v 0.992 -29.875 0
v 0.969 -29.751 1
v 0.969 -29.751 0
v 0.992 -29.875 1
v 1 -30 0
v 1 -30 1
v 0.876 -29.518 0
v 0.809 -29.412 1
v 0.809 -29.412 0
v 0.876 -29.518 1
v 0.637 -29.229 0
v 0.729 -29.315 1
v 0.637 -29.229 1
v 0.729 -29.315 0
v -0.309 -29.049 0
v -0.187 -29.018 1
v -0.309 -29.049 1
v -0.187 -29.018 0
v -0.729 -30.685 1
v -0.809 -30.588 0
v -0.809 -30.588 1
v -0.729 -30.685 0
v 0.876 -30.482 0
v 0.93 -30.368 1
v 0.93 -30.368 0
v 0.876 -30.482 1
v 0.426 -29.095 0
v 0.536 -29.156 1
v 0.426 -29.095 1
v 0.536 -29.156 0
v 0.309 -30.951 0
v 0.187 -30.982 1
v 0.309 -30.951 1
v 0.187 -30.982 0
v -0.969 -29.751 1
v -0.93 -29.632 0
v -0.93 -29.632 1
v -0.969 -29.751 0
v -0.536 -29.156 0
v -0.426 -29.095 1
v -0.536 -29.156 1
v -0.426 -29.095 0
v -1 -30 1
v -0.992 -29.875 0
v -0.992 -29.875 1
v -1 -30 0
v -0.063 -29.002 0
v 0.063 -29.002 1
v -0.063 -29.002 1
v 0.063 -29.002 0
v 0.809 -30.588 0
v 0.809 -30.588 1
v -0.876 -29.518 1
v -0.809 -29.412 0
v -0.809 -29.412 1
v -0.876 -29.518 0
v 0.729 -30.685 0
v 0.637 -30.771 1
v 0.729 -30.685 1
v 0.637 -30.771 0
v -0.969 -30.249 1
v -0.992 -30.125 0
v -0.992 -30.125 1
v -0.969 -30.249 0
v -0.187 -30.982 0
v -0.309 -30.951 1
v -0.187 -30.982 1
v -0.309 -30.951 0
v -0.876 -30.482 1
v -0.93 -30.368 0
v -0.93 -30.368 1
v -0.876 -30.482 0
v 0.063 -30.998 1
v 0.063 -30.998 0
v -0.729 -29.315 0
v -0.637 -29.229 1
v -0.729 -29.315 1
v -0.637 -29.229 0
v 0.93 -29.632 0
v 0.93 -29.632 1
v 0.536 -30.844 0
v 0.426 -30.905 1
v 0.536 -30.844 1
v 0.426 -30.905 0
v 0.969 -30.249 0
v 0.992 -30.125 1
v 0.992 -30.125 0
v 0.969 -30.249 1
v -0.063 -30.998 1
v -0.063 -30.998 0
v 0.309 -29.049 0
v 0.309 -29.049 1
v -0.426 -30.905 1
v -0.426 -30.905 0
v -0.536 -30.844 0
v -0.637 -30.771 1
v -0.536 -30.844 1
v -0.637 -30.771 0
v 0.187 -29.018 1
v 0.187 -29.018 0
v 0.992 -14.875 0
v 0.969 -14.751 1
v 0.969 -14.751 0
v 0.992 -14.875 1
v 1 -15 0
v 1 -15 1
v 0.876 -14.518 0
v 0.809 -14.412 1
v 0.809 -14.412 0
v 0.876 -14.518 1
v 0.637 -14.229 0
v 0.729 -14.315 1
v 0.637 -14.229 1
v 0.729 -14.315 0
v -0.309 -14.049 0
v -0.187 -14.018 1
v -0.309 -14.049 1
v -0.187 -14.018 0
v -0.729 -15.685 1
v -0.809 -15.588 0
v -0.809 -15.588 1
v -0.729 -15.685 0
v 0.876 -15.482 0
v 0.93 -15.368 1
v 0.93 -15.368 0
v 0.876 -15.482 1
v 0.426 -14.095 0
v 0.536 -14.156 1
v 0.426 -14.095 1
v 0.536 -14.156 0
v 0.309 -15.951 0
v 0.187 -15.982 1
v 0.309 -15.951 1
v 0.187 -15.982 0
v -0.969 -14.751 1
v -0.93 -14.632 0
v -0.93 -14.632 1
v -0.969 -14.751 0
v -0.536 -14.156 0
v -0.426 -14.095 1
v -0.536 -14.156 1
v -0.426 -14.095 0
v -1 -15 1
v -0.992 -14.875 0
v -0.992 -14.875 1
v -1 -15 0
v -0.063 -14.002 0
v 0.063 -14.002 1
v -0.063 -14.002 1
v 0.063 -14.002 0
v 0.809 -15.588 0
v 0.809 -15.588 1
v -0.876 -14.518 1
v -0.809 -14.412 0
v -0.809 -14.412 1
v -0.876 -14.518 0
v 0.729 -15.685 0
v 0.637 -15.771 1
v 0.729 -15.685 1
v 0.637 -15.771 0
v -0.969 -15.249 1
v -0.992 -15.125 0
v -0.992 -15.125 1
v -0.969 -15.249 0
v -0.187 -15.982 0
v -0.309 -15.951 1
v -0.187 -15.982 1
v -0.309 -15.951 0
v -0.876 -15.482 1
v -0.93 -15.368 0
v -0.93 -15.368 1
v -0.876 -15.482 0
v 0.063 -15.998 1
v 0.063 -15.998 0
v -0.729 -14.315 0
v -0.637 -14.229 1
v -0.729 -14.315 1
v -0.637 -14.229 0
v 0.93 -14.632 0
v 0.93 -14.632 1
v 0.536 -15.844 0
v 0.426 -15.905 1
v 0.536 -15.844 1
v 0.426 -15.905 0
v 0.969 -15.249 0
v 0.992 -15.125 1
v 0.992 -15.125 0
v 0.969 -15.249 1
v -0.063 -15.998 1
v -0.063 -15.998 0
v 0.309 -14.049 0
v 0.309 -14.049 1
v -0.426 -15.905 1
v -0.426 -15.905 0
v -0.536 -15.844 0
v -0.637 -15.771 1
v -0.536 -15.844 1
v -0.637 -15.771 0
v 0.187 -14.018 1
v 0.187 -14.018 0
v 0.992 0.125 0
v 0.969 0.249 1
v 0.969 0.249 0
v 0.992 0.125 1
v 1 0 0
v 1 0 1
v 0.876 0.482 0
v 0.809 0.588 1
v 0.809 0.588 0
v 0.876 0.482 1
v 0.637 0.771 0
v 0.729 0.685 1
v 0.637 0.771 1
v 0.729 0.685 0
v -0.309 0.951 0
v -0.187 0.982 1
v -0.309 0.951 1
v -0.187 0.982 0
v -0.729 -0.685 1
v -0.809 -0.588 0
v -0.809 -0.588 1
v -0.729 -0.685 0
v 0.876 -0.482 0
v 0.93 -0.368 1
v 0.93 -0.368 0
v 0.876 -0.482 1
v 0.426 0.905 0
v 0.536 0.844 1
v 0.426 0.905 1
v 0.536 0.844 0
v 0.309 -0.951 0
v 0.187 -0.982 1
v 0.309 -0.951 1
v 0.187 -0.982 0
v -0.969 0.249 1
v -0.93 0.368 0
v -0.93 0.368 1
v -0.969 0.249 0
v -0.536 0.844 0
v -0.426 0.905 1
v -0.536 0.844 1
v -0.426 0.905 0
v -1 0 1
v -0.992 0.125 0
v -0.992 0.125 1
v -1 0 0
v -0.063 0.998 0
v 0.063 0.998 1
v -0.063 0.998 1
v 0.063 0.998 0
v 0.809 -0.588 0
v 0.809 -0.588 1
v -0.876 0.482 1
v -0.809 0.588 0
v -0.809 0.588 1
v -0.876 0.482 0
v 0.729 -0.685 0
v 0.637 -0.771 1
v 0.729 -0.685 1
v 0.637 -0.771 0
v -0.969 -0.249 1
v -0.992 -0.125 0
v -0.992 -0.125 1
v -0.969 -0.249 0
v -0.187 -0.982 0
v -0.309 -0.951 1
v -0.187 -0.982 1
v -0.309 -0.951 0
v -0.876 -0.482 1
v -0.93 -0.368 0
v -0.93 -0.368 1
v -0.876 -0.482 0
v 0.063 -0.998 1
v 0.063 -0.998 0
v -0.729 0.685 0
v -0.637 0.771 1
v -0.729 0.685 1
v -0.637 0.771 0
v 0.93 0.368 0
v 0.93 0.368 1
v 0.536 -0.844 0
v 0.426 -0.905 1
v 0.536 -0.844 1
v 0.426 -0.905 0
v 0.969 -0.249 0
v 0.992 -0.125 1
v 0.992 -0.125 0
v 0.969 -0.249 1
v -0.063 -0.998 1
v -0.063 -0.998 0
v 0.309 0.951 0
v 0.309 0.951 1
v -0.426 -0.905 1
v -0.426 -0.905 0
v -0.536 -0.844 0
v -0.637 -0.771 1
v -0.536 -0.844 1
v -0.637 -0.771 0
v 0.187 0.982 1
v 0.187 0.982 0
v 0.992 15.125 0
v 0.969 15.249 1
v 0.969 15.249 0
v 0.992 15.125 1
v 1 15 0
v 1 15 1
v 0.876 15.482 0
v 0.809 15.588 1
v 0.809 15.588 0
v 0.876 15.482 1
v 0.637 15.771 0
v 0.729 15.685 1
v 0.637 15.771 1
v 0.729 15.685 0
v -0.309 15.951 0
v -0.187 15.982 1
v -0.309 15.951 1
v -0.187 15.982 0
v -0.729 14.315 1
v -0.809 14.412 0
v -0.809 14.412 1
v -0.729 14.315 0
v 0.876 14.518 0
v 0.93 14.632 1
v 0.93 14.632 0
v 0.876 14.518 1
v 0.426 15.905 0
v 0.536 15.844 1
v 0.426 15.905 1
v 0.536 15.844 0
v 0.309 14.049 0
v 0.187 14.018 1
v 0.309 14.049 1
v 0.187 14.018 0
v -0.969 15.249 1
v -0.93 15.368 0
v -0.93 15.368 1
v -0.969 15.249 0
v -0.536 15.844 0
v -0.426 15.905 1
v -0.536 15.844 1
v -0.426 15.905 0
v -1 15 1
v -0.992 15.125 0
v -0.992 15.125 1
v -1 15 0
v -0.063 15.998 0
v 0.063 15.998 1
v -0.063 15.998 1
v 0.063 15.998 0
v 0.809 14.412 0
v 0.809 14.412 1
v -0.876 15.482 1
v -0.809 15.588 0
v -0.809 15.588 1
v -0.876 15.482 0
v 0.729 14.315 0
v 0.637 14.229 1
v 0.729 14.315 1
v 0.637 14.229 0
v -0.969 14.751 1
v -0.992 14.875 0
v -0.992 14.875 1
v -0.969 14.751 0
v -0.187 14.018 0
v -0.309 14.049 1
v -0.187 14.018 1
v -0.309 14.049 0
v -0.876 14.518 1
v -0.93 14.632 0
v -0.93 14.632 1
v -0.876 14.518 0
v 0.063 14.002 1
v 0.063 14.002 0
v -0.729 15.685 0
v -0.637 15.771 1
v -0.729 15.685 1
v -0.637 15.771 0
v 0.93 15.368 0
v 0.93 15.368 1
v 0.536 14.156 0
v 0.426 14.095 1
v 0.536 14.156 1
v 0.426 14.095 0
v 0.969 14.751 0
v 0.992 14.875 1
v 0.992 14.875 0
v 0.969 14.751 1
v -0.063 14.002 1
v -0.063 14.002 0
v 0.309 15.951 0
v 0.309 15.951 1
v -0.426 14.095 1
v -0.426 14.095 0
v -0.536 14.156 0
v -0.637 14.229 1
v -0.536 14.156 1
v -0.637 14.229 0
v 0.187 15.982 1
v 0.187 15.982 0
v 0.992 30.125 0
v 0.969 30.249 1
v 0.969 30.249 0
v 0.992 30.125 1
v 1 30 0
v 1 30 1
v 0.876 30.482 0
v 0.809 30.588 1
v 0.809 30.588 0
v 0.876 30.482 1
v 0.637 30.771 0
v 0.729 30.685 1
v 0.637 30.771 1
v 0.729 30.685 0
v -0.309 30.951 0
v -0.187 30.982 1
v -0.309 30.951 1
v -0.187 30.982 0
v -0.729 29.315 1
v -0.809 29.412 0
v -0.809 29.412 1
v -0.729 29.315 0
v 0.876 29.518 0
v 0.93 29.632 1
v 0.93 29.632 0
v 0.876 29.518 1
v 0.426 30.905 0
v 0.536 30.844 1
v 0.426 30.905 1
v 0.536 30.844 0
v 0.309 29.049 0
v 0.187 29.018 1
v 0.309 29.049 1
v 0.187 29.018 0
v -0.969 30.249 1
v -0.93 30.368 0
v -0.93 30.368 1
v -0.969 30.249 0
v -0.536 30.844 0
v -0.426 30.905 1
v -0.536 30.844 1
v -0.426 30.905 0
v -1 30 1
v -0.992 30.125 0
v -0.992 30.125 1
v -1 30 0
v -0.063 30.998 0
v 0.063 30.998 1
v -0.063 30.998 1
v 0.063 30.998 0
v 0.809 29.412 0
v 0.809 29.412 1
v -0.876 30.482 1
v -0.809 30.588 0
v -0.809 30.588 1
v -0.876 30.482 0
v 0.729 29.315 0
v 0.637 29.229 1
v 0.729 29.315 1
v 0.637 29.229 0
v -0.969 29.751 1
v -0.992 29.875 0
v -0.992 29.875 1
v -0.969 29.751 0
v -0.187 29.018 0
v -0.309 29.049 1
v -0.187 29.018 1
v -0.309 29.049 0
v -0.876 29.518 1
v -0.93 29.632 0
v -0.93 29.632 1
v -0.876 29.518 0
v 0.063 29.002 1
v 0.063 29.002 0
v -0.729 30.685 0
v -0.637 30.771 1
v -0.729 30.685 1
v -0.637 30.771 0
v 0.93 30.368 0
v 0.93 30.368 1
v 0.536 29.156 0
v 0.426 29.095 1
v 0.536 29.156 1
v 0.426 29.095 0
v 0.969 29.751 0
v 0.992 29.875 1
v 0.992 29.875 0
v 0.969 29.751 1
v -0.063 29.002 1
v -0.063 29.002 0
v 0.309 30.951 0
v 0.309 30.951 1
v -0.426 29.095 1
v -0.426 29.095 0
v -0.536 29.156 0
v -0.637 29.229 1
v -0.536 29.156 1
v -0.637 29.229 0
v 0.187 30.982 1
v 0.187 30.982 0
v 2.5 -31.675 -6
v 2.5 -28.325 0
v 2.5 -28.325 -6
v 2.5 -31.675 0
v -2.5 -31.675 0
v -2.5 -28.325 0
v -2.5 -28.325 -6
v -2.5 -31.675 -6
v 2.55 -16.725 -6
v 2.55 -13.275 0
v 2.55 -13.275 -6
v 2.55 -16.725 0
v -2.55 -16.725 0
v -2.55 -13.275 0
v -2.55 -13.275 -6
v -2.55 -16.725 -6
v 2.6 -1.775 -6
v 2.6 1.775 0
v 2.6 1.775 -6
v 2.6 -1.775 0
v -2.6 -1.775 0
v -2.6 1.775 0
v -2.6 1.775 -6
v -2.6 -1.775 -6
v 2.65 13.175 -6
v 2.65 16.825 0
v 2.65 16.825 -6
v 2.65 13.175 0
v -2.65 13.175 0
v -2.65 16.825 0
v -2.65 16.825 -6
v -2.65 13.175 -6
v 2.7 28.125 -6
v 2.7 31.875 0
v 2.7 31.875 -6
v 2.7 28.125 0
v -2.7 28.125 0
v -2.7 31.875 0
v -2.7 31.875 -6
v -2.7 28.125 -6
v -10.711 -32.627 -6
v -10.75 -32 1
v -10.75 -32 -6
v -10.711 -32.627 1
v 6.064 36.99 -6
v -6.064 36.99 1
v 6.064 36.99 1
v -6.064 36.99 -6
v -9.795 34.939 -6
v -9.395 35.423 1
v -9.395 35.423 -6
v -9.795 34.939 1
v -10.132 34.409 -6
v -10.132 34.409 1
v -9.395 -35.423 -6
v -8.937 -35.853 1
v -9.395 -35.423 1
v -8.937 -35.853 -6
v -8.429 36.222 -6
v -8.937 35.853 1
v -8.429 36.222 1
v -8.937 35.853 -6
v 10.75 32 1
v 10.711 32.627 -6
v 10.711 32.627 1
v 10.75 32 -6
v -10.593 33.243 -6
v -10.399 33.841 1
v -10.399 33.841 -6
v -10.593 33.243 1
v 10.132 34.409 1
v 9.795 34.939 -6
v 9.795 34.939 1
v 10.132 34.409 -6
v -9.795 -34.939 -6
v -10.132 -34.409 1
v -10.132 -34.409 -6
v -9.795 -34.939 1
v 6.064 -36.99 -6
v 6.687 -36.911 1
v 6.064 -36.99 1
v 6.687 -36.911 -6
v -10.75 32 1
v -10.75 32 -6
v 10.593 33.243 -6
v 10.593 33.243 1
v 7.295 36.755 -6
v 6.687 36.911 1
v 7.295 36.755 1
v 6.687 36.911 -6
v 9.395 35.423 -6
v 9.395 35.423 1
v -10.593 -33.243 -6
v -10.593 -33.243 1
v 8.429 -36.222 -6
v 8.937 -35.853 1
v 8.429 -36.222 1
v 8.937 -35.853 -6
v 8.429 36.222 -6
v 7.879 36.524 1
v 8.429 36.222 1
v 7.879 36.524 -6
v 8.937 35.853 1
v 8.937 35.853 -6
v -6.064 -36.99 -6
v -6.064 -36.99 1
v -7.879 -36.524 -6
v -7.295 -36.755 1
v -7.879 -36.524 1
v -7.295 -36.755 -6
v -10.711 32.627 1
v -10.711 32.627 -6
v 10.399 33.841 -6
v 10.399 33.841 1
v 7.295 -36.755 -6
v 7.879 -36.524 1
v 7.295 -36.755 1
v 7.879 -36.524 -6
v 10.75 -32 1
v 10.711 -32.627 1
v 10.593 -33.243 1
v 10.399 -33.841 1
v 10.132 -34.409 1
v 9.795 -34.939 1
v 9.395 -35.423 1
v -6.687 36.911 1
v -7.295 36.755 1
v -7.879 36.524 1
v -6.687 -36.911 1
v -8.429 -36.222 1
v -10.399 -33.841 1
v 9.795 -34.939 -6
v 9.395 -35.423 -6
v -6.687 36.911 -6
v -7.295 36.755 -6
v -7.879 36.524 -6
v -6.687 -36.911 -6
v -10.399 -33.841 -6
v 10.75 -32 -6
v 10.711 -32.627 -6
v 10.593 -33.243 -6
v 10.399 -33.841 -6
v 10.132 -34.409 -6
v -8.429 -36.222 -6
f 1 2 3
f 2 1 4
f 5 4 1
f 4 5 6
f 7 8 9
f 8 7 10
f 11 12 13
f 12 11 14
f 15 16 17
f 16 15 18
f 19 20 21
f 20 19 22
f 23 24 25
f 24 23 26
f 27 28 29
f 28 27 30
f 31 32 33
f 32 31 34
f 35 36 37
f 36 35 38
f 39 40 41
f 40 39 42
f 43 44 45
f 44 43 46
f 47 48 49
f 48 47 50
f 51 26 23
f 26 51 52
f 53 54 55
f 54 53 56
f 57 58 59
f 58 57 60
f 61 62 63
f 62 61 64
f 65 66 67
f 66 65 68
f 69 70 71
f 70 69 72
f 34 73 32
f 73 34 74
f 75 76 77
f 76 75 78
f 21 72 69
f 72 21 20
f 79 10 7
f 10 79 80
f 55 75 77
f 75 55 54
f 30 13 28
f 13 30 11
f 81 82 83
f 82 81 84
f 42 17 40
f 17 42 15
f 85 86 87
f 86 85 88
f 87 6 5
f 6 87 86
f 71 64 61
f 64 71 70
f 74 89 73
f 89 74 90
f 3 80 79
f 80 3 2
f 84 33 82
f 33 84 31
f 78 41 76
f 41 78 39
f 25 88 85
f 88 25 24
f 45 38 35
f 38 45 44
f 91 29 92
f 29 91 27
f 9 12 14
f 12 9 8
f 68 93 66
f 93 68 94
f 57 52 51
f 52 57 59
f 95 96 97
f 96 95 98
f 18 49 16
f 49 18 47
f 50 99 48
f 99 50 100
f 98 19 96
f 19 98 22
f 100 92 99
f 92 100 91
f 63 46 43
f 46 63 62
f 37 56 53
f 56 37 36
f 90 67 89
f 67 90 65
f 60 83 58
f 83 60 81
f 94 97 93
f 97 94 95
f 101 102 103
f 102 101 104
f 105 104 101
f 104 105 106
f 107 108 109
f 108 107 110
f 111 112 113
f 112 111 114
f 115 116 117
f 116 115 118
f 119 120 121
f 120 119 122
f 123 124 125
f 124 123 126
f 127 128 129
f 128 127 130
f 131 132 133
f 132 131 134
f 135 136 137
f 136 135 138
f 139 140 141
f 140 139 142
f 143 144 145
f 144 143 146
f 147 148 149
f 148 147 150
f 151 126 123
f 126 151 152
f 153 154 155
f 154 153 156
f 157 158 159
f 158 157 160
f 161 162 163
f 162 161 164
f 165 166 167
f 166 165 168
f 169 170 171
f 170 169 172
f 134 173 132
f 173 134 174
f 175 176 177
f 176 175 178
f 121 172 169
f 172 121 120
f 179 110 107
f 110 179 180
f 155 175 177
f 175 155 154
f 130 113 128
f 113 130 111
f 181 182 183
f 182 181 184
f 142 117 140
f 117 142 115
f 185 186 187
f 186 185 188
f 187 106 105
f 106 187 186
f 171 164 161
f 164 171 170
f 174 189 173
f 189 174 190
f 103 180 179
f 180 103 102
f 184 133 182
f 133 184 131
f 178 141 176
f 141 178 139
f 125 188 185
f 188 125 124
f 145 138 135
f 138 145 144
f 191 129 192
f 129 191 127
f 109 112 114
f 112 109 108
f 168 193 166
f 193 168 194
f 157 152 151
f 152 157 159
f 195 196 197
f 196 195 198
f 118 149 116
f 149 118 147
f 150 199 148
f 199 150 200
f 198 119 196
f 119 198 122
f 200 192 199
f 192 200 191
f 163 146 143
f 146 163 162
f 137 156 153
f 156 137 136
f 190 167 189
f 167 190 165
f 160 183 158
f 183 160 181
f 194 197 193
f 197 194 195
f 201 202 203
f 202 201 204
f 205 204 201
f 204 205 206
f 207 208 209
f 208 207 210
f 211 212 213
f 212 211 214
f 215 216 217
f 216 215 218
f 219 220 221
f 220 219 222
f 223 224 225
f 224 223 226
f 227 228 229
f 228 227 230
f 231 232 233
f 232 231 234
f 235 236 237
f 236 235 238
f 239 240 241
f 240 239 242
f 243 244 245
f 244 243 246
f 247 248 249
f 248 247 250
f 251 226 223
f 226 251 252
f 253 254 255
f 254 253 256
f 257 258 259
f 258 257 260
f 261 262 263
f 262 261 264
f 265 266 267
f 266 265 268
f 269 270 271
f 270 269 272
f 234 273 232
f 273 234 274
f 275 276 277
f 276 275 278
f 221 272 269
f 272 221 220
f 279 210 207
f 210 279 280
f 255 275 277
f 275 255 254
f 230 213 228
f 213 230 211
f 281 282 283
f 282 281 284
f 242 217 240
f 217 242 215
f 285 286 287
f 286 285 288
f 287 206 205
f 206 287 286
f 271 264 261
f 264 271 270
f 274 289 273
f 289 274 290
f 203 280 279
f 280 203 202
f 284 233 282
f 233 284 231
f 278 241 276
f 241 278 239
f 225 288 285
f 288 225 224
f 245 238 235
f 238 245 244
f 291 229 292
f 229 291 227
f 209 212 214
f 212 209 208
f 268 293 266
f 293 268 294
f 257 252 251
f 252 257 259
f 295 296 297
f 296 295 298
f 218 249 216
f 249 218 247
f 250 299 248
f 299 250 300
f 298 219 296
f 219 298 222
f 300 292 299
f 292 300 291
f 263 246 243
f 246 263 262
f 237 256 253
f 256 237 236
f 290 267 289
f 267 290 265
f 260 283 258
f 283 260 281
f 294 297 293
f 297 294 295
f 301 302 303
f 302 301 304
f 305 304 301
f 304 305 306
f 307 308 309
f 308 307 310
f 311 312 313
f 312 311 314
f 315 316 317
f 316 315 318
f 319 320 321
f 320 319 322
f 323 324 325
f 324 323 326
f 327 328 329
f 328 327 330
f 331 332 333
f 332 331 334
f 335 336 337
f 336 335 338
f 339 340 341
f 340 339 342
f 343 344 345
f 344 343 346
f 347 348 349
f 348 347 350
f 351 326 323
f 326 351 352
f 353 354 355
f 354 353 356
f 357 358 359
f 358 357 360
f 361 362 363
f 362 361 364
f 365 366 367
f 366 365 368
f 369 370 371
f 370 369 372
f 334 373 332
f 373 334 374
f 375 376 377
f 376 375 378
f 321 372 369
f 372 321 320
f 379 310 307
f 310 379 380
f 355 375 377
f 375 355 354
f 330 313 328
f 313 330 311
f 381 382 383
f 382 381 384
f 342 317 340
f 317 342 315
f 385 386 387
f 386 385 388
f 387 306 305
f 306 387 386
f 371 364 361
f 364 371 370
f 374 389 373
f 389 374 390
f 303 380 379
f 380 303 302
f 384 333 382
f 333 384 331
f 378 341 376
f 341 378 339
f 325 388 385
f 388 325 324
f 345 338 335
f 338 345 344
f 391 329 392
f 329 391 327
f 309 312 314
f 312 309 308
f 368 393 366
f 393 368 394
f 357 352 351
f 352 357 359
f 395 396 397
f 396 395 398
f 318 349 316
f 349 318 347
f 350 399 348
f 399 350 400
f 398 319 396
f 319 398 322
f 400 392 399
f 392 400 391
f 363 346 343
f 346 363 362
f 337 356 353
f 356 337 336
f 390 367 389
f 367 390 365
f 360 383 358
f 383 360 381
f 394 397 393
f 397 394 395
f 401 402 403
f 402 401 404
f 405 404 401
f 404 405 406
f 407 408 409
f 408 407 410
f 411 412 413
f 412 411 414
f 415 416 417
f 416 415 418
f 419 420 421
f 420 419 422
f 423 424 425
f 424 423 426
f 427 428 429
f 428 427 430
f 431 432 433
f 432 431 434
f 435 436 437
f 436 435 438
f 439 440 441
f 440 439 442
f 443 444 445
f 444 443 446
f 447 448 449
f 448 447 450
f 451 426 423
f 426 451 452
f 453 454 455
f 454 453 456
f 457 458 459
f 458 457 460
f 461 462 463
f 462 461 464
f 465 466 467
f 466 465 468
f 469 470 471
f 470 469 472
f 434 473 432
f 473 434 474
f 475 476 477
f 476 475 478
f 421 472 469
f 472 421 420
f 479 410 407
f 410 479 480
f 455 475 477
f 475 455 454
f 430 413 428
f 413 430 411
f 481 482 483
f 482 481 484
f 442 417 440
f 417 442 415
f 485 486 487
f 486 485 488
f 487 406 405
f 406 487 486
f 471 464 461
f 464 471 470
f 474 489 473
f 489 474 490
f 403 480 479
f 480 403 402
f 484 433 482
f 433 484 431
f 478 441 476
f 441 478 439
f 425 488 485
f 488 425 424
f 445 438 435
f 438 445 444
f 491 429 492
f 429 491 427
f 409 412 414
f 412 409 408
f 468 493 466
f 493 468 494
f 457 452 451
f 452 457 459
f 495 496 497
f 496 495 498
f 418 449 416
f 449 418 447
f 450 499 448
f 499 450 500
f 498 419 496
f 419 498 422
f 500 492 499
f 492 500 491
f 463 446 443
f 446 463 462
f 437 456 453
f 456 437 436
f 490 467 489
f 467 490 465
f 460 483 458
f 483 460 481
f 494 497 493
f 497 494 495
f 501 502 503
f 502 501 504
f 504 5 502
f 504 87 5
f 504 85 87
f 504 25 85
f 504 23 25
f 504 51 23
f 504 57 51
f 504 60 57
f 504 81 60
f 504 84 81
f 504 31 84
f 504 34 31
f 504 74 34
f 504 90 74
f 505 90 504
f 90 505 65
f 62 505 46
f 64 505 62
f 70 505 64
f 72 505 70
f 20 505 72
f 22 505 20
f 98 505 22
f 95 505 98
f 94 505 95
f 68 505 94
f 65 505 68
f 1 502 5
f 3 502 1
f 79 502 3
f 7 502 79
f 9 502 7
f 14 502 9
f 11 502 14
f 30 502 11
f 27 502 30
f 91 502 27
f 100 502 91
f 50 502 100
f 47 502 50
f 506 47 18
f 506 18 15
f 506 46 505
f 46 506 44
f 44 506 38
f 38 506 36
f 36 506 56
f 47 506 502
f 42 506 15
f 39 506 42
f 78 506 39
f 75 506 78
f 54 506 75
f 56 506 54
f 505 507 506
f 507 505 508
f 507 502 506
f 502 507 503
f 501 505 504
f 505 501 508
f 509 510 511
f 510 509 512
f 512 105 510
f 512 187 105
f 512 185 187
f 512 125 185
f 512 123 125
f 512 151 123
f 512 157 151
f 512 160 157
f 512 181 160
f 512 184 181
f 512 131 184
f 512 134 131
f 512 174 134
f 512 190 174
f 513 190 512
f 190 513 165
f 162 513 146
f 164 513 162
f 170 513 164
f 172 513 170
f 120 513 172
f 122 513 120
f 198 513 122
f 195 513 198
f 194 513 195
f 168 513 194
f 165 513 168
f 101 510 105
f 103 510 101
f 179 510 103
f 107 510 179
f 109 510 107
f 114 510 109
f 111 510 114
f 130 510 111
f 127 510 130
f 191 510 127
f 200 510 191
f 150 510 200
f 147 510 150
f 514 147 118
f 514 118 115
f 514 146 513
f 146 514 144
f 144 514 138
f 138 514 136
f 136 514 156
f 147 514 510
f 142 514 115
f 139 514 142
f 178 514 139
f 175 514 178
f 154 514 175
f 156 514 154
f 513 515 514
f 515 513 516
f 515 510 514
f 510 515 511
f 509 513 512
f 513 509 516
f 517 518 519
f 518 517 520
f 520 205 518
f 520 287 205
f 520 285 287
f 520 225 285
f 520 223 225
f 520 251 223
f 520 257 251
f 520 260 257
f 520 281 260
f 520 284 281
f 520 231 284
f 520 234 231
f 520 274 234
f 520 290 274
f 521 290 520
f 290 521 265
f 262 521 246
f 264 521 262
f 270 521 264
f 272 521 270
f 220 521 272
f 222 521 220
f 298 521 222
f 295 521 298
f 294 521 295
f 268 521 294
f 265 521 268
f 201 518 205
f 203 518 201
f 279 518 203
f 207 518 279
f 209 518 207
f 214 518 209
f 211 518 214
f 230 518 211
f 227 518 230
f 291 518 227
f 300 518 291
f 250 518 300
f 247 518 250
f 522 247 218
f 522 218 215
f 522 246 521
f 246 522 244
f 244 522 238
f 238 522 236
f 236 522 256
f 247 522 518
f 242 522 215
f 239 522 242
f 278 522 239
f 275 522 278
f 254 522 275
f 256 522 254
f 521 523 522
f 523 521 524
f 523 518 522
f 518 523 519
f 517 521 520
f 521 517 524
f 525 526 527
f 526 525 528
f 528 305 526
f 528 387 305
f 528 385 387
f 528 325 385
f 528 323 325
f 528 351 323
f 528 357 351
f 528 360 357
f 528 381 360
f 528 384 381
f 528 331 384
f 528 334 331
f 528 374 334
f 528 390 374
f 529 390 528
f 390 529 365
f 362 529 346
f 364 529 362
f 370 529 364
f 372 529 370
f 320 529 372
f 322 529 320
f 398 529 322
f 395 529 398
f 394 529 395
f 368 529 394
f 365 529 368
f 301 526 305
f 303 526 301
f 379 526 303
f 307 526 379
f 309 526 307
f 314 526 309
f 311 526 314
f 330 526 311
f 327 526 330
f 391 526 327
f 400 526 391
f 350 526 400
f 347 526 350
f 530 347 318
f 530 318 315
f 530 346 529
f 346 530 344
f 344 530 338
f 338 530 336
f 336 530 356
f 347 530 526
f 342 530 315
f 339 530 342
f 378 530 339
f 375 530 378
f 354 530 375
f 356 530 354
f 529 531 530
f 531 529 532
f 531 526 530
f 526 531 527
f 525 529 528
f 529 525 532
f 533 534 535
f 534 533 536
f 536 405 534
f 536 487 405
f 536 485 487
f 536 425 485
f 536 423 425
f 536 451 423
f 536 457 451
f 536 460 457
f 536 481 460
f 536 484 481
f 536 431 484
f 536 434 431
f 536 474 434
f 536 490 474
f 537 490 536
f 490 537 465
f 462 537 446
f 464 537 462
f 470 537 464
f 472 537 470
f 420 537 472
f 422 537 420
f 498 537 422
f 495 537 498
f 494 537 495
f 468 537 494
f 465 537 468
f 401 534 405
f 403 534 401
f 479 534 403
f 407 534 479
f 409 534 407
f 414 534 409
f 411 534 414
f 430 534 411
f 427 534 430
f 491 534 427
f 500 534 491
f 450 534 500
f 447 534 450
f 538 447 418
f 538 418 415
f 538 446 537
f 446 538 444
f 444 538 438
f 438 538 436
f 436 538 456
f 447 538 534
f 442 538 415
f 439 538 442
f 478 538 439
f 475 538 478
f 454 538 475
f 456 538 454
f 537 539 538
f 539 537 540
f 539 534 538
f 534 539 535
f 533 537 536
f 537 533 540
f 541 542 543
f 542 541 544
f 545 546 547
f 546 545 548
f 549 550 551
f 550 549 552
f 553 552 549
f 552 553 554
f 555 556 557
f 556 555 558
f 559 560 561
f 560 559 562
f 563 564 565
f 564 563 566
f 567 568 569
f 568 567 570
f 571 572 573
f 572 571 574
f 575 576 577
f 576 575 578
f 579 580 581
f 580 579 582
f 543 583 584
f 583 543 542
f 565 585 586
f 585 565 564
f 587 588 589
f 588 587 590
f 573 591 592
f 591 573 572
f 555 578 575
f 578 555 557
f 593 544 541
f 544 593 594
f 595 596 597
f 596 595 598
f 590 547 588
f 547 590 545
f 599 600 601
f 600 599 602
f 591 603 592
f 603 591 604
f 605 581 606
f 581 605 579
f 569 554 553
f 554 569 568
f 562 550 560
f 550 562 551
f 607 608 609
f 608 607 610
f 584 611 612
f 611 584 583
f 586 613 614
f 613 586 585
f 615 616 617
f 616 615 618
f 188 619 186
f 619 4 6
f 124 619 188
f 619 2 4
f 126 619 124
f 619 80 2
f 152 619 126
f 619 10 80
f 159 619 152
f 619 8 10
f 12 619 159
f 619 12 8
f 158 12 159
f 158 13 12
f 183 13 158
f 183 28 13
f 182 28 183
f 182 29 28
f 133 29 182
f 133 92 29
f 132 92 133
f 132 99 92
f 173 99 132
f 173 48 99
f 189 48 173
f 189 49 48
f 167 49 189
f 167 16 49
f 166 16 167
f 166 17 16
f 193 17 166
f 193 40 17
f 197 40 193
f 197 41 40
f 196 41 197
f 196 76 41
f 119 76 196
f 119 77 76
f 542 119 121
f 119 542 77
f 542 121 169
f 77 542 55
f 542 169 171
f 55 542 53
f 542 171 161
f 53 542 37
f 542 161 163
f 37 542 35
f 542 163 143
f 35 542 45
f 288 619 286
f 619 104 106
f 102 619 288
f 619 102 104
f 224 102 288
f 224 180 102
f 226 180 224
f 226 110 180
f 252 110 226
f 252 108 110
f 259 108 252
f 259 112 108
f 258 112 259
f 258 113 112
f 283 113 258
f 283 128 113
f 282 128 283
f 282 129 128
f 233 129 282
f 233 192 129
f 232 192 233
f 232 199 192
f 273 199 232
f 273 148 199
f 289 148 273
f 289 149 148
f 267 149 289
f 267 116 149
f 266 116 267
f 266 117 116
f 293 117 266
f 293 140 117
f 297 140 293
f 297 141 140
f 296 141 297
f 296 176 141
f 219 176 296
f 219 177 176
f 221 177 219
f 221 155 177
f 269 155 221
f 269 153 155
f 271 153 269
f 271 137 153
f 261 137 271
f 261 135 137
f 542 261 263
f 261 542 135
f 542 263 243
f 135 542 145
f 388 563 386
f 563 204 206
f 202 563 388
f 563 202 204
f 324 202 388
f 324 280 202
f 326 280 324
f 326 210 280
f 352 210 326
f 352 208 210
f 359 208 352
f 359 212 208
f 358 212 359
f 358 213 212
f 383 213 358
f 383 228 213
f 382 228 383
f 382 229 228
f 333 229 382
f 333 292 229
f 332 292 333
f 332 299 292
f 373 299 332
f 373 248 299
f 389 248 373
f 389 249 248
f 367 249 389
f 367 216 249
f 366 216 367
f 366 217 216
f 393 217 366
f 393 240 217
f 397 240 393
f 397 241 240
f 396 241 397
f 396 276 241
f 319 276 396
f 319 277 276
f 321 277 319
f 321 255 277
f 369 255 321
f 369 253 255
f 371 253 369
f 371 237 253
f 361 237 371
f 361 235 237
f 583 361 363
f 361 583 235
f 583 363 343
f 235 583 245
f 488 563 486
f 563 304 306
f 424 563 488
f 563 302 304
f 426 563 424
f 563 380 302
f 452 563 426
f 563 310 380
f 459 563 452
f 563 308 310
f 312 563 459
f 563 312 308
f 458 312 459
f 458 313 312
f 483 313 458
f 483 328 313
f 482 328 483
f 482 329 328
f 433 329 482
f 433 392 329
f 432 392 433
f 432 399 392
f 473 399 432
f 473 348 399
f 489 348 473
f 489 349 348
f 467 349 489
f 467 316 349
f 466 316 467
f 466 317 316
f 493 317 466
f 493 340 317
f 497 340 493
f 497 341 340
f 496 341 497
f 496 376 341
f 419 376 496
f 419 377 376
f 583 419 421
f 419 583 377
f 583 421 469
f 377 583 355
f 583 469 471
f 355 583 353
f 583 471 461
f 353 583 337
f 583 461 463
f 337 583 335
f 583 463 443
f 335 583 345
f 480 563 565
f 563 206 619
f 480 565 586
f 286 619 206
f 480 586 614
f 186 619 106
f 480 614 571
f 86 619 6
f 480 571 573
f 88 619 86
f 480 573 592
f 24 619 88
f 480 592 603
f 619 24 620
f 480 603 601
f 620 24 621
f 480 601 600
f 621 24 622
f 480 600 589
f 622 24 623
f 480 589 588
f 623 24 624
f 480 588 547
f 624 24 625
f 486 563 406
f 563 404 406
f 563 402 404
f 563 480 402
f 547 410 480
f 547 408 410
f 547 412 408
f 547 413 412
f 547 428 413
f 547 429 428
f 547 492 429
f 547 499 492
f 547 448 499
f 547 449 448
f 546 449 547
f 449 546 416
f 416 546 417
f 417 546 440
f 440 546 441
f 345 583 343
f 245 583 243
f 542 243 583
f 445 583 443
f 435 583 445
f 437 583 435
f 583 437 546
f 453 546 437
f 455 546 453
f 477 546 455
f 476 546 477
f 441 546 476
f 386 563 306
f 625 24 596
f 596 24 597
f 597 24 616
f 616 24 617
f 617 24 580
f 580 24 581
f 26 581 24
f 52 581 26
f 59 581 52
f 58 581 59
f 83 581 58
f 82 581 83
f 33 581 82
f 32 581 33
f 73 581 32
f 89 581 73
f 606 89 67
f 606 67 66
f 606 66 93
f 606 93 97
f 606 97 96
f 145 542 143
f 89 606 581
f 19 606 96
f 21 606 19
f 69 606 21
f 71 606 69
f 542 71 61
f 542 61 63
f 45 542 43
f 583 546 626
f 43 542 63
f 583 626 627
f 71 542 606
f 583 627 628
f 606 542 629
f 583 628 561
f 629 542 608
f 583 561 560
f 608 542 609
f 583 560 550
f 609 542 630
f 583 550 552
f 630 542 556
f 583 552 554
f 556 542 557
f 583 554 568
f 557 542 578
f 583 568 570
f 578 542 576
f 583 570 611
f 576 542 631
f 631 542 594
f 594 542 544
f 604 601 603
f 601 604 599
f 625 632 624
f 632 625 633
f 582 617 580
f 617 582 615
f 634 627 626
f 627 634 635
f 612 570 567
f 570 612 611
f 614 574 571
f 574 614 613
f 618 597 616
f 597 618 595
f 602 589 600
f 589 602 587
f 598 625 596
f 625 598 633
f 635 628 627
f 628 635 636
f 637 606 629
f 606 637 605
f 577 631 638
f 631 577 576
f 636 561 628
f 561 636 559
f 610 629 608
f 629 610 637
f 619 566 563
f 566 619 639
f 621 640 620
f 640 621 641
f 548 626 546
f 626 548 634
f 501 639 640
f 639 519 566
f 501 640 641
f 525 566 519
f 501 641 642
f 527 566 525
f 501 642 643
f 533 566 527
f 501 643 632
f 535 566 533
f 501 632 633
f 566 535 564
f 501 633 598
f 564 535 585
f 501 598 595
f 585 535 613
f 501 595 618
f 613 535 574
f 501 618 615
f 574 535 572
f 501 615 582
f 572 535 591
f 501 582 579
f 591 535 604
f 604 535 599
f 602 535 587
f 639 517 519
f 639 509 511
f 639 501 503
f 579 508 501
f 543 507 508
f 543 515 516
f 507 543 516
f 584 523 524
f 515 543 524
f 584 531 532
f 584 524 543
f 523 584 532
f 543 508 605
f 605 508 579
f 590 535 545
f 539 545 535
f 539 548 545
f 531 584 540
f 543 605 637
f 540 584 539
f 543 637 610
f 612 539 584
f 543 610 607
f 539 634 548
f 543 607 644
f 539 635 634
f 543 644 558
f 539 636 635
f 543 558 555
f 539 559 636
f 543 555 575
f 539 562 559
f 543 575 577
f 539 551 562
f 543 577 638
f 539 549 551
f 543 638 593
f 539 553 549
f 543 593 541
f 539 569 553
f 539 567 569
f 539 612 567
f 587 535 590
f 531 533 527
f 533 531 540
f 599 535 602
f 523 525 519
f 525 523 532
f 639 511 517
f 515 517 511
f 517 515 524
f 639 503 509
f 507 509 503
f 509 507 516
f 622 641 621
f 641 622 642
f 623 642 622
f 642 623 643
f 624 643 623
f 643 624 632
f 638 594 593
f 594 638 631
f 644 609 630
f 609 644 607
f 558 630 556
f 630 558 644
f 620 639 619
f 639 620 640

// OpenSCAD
$fn = 50;


difference() {
	union() {
		*color(alpha = 1.0000000000, c = "gray") {
			translate(v = [0, 14, -6]) {
				linear_extrude(height = 5) {
					text(font = "Arial:style=Bold", halign = "center", size = 4.5000000000, text = "COMMENT description oobb_plate_shape_p_type_7_depth_0_0_-6_pos_1.5_width_5_height", valign = "center");
				}
			}
		}
		translate(v = [0, 0, -6]) {
			hull() {
				translate(v = [-5.7500000000, 32.0000000000, 0]) {
					cylinder(h = 7, r = 5);
				}
				translate(v = [5.7500000000, 32.0000000000, 0]) {
					cylinder(h = 7, r = 5);
				}
				translate(v = [-5.7500000000, -32.0000000000, 0]) {
					cylinder(h = 7, r = 5);
				}
				translate(v = [5.7500000000, -32.0000000000, 0]) {
					cylinder(h = 7, r = 5);
				}
			}
		}
		*color(alpha = 1.0000000000, c = "gray") {
			translate(v = [0, 21, 0]) {
				linear_extrude(height = 1) {
					text(font = "Arial:style=Bold", halign = "center", size = 4.5000000000, text = "COMMENT oobb_motor_tt_01_0_0", valign = "center");
				}
			}
		}
		*color(alpha = 1.0000000000, c = "gray") {
			translate(v = [0, 14, 0]) {
				linear_extrude(height = 1) {
					text(font = "Arial:style=Bold", halign = "center", size = 4.5000000000, text = " radius_extra : 0", valign = "center");
				}
			}
		}
		*color(alpha = 1.0000000000, c = "gray") {
			translate(v = [0, 36, 0]) {
				linear_extrude(height = 1) {
					text(font = "Arial:style=Bold", halign = "center", size = 4.5000000000, text = "COMMENT oobb_motor_tt_01_0.1_0.1", valign = "center");
				}
			}
		}
		*color(alpha = 1.0000000000, c = "gray") {
			translate(v = [0, 29, 0]) {
				linear_extrude(height = 1) {
					text(font = "Arial:style=Bold", halign = "center", size = 4.5000000000, text = " radius_extra : 0.1", valign = "center");
				}
			}
		}
		*color(alpha = 1.0000000000, c = "gray") {
			translate(v = [0, 51, 0]) {
				linear_extrude(height = 1) {
					text(font = "Arial:style=Bold", halign = "center", size = 4.5000000000, text = "COMMENT oobb_motor_tt_01_0.2_0.2", valign = "center");
				}
			}
		}
		*color(alpha = 1.0000000000, c = "gray") {
			translate(v = [0, 44, 0]) {
				linear_extrude(height = 1) {
					text(font = "Arial:style=Bold", halign = "center", size = 4.5000000000, text = " radius_extra : 0.2", valign = "center");
				}
			}
		}
		*color(alpha = 1.0000000000, c = "gray") {
			translate(v = [0, 66, 0]) {
				linear_extrude(height = 1) {
					text(font = "Arial:style=Bold", halign = "center", size = 4.5000000000, text = "COMMENT oobb_motor_tt_01_0.3_0.3", valign = "center");
				}
			}
		}
		*color(alpha = 1.0000000000, c = "gray") {
			translate(v = [0, 59, 0]) {
				linear_extrude(height = 1) {
					text(font = "Arial:style=Bold", halign = "center", size = 4.5000000000, text = " radius_extra : 0.3", valign = "center");
				}
			}
		}
		*color(alpha = 1.0000000000, c = "gray") {
			translate(v = [0, 81, 0]) {
				linear_extrude(height = 1) {
					text(font = "Arial:style=Bold", halign = "center", size = 4.5000000000, text = "COMMENT oobb_motor_tt_01_0.4_0.4", valign = "center");
				}
			}
		}
		*color(alpha = 1.0000000000, c = "gray") {
			translate(v = [0, 74, 0]) {
				linear_extrude(height = 1) {
					text(font = "Arial:style=Bold", halign = "center", size = 4.5000000000, text = " radius_extra : 0.4", valign = "center");
				}
			}
		}
	}
	union() {
		translate(v = [0, -30, 2]) {
			rotate(a = [0, 0, 0]) {
				difference() {
					union() {
						translate(v = [0, 0, -12.0000000000]) {
							cylinder(h = 12, r = 0.7500000000);
						}
						cylinder(h = 52.5000000000, r = 2.7500000000);
						translate(v = [0, 0, -12.0000000000]) {
							cylinder(h = 12, r = 1.0000000000);
						}
						translate(v = [-1.2500000000, -2.7500000000, -0.3000000000]) {
							cube(size = [2.5000000000, 5.5000000000, 0.3000000000]);
						}
						translate(v = [-1.2500000000, -1.2500000000, -0.6000000000]) {
							cube(size = [2.5000000000, 2.5000000000, 0.3000000000]);
						}
						translate(v = [0, 0, -12.0000000000]) {
							cylinder(h = 12, r = 0.7500000000);
						}
					}
					union();
				}
			}
		}
		translate(v = [0, -15, 2]) {
			rotate(a = [0, 0, 0]) {
				difference() {
					union() {
						translate(v = [0, 0, -12.0000000000]) {
							cylinder(h = 12, r = 0.7500000000);
						}
						cylinder(h = 52.5000000000, r = 2.7500000000);
						translate(v = [0, 0, -12.0000000000]) {
							cylinder(h = 12, r = 1.0000000000);
						}
						translate(v = [-1.2500000000, -2.7500000000, -0.3000000000]) {
							cube(size = [2.5000000000, 5.5000000000, 0.3000000000]);
						}
						translate(v = [-1.2500000000, -1.2500000000, -0.6000000000]) {
							cube(size = [2.5000000000, 2.5000000000, 0.3000000000]);
						}
						translate(v = [0, 0, -12.0000000000]) {
							cylinder(h = 12, r = 0.7500000000);
						}
					}
					union();
				}
			}
		}
		translate(v = [0, 0, 2]) {
			rotate(a = [0, 0, 0]) {
				difference() {
					union() {
						translate(v = [0, 0, -12.0000000000]) {
							cylinder(h = 12, r = 0.7500000000);
						}
						cylinder(h = 52.5000000000, r = 2.7500000000);
						translate(v = [0, 0, -12.0000000000]) {
							cylinder(h = 12, r = 1.0000000000);
						}
						translate(v = [-1.2500000000, -2.7500000000, -0.3000000000]) {
							cube(size = [2.5000000000, 5.5000000000, 0.3000000000]);
						}
						translate(v = [-1.2500000000, -1.2500000000, -0.6000000000]) {
							cube(size = [2.5000000000, 2.5000000000, 0.3000000000]);
						}
						translate(v = [0, 0, -12.0000000000]) {
							cylinder(h = 12, r = 0.7500000000);
						}
					}
					union();
				}
			}
		}
		translate(v = [0, 15, 2]) {
			rotate(a = [0, 0, 0]) {
				difference() {
					union() {
						translate(v = [0, 0, -12.0000000000]) {
							cylinder(h = 12, r = 0.7500000000);
						}
						cylinder(h = 52.5000000000, r = 2.7500000000);
						translate(v = [0, 0, -12.0000000000]) {
							cylinder(h = 12, r = 1.0000000000);
						}
						translate(v = [-1.2500000000, -2.7500000000, -0.3000000000]) {
							cube(size = [2.5000000000, 5.5000000000, 0.3000000000]);
						}
						translate(v = [-1.2500000000, -1.2500000000, -0.6000000000]) {
							cube(size = [2.5000000000, 2.5000000000, 0.3000000000]);
						}
						translate(v = [0, 0, -12.0000000000]) {
							cylinder(h = 12, r = 0.7500000000);
						}
					}
					union();
				}
			}
		}
		translate(v = [0, 30, 2]) {
			rotate(a = [0, 0, 0]) {
				difference() {
					union() {
						translate(v = [0, 0, -12.0000000000]) {
							cylinder(h = 12, r = 0.7500000000);
						}
						cylinder(h = 52.5000000000, r = 2.7500000000);
						translate(v = [0, 0, -12.0000000000]) {
							cylinder(h = 12, r = 1.0000000000);
						}
						translate(v = [-1.2500000000, -2.7500000000, -0.3000000000]) {
							cube(size = [2.5000000000, 5.5000000000, 0.3000000000]);
						}
						translate(v = [-1.2500000000, -1.2500000000, -0.6000000000]) {
							cube(size = [2.5000000000, 2.5000000000, 0.3000000000]);
						}
						translate(v = [0, 0, -12.0000000000]) {
							cylinder(h = 12, r = 0.7500000000);
						}
					}
					union();
				}
			}
		}
		*color(alpha = 1.0000000000, c = "gray") {
			translate(v = [0, 14, 0]) {
				linear_extrude(height = 1) {
					text(font = "Arial:style=Bold", halign = "center", size = 4.5000000000, text = "COMMENT description oobb_motor_tt_01_shape_n_type_50_depth_0_-30_0_pos_shaft_part_30_comment_shift_line_{}_extra_0_radius_extra", valign = "center");
				}
			}
		}
		translate(v = [-2.5000000000, -31.6750000000, -50]) {
			cube(size = [5.0000000000, 3.3500000000, 50]);
		}
		*color(alpha = 1.0000000000, c = "gray") {
			translate(v = [0, 29, 0]) {
				linear_extrude(height = 1) {
					text(font = "Arial:style=Bold", halign = "center", size = 4.5000000000, text = "COMMENT description oobb_motor_tt_01_shape_n_type_50_depth_0_-15_0_pos_shaft_part_30_comment_shift_line_{}_extra_0.1_radius_extra", valign = "center");
				}
			}
		}
		translate(v = [-2.5500000000, -16.7250000000, -50]) {
			cube(size = [5.1000000000, 3.4500000000, 50]);
		}
		*color(alpha = 1.0000000000, c = "gray") {
			translate(v = [0, 44, 0]) {
				linear_extrude(height = 1) {
					text(font = "Arial:style=Bold", halign = "center", size = 4.5000000000, text = "COMMENT description oobb_motor_tt_01_shape_n_type_50_depth_shaft_part_30_comment_shift_line_{}_extra_0.2_radius_extra", valign = "center");
				}
			}
		}
		translate(v = [-2.6000000000, -1.7750000000, -50]) {
			cube(size = [5.2000000000, 3.5500000000, 50]);
		}
		*color(alpha = 1.0000000000, c = "gray") {
			translate(v = [0, 59, 0]) {
				linear_extrude(height = 1) {
					text(font = "Arial:style=Bold", halign = "center", size = 4.5000000000, text = "COMMENT description oobb_motor_tt_01_shape_n_type_50_depth_0_15_0_pos_shaft_part_30_comment_shift_line_{}_extra_0.3_radius_extra", valign = "center");
				}
			}
		}
		translate(v = [-2.6500000000, 13.1750000000, -50]) {
			cube(size = [5.3000000000, 3.6500000000, 50]);
		}
		*color(alpha = 1.0000000000, c = "gray") {
			translate(v = [0, 74, 0]) {
				linear_extrude(height = 1) {
					text(font = "Arial:style=Bold", halign = "center", size = 4.5000000000, text = "COMMENT description oobb_motor_tt_01_shape_n_type_50_depth_0_30_0_pos_shaft_part_30_comment_shift_line_{}_extra_0.4_radius_extra", valign = "center");
				}
			}
		}
		translate(v = [-2.7000000000, 28.1250000000, -50]) {
			cube(size = [5.4000000000, 3.7500000000, 50]);
		}
	}
}
